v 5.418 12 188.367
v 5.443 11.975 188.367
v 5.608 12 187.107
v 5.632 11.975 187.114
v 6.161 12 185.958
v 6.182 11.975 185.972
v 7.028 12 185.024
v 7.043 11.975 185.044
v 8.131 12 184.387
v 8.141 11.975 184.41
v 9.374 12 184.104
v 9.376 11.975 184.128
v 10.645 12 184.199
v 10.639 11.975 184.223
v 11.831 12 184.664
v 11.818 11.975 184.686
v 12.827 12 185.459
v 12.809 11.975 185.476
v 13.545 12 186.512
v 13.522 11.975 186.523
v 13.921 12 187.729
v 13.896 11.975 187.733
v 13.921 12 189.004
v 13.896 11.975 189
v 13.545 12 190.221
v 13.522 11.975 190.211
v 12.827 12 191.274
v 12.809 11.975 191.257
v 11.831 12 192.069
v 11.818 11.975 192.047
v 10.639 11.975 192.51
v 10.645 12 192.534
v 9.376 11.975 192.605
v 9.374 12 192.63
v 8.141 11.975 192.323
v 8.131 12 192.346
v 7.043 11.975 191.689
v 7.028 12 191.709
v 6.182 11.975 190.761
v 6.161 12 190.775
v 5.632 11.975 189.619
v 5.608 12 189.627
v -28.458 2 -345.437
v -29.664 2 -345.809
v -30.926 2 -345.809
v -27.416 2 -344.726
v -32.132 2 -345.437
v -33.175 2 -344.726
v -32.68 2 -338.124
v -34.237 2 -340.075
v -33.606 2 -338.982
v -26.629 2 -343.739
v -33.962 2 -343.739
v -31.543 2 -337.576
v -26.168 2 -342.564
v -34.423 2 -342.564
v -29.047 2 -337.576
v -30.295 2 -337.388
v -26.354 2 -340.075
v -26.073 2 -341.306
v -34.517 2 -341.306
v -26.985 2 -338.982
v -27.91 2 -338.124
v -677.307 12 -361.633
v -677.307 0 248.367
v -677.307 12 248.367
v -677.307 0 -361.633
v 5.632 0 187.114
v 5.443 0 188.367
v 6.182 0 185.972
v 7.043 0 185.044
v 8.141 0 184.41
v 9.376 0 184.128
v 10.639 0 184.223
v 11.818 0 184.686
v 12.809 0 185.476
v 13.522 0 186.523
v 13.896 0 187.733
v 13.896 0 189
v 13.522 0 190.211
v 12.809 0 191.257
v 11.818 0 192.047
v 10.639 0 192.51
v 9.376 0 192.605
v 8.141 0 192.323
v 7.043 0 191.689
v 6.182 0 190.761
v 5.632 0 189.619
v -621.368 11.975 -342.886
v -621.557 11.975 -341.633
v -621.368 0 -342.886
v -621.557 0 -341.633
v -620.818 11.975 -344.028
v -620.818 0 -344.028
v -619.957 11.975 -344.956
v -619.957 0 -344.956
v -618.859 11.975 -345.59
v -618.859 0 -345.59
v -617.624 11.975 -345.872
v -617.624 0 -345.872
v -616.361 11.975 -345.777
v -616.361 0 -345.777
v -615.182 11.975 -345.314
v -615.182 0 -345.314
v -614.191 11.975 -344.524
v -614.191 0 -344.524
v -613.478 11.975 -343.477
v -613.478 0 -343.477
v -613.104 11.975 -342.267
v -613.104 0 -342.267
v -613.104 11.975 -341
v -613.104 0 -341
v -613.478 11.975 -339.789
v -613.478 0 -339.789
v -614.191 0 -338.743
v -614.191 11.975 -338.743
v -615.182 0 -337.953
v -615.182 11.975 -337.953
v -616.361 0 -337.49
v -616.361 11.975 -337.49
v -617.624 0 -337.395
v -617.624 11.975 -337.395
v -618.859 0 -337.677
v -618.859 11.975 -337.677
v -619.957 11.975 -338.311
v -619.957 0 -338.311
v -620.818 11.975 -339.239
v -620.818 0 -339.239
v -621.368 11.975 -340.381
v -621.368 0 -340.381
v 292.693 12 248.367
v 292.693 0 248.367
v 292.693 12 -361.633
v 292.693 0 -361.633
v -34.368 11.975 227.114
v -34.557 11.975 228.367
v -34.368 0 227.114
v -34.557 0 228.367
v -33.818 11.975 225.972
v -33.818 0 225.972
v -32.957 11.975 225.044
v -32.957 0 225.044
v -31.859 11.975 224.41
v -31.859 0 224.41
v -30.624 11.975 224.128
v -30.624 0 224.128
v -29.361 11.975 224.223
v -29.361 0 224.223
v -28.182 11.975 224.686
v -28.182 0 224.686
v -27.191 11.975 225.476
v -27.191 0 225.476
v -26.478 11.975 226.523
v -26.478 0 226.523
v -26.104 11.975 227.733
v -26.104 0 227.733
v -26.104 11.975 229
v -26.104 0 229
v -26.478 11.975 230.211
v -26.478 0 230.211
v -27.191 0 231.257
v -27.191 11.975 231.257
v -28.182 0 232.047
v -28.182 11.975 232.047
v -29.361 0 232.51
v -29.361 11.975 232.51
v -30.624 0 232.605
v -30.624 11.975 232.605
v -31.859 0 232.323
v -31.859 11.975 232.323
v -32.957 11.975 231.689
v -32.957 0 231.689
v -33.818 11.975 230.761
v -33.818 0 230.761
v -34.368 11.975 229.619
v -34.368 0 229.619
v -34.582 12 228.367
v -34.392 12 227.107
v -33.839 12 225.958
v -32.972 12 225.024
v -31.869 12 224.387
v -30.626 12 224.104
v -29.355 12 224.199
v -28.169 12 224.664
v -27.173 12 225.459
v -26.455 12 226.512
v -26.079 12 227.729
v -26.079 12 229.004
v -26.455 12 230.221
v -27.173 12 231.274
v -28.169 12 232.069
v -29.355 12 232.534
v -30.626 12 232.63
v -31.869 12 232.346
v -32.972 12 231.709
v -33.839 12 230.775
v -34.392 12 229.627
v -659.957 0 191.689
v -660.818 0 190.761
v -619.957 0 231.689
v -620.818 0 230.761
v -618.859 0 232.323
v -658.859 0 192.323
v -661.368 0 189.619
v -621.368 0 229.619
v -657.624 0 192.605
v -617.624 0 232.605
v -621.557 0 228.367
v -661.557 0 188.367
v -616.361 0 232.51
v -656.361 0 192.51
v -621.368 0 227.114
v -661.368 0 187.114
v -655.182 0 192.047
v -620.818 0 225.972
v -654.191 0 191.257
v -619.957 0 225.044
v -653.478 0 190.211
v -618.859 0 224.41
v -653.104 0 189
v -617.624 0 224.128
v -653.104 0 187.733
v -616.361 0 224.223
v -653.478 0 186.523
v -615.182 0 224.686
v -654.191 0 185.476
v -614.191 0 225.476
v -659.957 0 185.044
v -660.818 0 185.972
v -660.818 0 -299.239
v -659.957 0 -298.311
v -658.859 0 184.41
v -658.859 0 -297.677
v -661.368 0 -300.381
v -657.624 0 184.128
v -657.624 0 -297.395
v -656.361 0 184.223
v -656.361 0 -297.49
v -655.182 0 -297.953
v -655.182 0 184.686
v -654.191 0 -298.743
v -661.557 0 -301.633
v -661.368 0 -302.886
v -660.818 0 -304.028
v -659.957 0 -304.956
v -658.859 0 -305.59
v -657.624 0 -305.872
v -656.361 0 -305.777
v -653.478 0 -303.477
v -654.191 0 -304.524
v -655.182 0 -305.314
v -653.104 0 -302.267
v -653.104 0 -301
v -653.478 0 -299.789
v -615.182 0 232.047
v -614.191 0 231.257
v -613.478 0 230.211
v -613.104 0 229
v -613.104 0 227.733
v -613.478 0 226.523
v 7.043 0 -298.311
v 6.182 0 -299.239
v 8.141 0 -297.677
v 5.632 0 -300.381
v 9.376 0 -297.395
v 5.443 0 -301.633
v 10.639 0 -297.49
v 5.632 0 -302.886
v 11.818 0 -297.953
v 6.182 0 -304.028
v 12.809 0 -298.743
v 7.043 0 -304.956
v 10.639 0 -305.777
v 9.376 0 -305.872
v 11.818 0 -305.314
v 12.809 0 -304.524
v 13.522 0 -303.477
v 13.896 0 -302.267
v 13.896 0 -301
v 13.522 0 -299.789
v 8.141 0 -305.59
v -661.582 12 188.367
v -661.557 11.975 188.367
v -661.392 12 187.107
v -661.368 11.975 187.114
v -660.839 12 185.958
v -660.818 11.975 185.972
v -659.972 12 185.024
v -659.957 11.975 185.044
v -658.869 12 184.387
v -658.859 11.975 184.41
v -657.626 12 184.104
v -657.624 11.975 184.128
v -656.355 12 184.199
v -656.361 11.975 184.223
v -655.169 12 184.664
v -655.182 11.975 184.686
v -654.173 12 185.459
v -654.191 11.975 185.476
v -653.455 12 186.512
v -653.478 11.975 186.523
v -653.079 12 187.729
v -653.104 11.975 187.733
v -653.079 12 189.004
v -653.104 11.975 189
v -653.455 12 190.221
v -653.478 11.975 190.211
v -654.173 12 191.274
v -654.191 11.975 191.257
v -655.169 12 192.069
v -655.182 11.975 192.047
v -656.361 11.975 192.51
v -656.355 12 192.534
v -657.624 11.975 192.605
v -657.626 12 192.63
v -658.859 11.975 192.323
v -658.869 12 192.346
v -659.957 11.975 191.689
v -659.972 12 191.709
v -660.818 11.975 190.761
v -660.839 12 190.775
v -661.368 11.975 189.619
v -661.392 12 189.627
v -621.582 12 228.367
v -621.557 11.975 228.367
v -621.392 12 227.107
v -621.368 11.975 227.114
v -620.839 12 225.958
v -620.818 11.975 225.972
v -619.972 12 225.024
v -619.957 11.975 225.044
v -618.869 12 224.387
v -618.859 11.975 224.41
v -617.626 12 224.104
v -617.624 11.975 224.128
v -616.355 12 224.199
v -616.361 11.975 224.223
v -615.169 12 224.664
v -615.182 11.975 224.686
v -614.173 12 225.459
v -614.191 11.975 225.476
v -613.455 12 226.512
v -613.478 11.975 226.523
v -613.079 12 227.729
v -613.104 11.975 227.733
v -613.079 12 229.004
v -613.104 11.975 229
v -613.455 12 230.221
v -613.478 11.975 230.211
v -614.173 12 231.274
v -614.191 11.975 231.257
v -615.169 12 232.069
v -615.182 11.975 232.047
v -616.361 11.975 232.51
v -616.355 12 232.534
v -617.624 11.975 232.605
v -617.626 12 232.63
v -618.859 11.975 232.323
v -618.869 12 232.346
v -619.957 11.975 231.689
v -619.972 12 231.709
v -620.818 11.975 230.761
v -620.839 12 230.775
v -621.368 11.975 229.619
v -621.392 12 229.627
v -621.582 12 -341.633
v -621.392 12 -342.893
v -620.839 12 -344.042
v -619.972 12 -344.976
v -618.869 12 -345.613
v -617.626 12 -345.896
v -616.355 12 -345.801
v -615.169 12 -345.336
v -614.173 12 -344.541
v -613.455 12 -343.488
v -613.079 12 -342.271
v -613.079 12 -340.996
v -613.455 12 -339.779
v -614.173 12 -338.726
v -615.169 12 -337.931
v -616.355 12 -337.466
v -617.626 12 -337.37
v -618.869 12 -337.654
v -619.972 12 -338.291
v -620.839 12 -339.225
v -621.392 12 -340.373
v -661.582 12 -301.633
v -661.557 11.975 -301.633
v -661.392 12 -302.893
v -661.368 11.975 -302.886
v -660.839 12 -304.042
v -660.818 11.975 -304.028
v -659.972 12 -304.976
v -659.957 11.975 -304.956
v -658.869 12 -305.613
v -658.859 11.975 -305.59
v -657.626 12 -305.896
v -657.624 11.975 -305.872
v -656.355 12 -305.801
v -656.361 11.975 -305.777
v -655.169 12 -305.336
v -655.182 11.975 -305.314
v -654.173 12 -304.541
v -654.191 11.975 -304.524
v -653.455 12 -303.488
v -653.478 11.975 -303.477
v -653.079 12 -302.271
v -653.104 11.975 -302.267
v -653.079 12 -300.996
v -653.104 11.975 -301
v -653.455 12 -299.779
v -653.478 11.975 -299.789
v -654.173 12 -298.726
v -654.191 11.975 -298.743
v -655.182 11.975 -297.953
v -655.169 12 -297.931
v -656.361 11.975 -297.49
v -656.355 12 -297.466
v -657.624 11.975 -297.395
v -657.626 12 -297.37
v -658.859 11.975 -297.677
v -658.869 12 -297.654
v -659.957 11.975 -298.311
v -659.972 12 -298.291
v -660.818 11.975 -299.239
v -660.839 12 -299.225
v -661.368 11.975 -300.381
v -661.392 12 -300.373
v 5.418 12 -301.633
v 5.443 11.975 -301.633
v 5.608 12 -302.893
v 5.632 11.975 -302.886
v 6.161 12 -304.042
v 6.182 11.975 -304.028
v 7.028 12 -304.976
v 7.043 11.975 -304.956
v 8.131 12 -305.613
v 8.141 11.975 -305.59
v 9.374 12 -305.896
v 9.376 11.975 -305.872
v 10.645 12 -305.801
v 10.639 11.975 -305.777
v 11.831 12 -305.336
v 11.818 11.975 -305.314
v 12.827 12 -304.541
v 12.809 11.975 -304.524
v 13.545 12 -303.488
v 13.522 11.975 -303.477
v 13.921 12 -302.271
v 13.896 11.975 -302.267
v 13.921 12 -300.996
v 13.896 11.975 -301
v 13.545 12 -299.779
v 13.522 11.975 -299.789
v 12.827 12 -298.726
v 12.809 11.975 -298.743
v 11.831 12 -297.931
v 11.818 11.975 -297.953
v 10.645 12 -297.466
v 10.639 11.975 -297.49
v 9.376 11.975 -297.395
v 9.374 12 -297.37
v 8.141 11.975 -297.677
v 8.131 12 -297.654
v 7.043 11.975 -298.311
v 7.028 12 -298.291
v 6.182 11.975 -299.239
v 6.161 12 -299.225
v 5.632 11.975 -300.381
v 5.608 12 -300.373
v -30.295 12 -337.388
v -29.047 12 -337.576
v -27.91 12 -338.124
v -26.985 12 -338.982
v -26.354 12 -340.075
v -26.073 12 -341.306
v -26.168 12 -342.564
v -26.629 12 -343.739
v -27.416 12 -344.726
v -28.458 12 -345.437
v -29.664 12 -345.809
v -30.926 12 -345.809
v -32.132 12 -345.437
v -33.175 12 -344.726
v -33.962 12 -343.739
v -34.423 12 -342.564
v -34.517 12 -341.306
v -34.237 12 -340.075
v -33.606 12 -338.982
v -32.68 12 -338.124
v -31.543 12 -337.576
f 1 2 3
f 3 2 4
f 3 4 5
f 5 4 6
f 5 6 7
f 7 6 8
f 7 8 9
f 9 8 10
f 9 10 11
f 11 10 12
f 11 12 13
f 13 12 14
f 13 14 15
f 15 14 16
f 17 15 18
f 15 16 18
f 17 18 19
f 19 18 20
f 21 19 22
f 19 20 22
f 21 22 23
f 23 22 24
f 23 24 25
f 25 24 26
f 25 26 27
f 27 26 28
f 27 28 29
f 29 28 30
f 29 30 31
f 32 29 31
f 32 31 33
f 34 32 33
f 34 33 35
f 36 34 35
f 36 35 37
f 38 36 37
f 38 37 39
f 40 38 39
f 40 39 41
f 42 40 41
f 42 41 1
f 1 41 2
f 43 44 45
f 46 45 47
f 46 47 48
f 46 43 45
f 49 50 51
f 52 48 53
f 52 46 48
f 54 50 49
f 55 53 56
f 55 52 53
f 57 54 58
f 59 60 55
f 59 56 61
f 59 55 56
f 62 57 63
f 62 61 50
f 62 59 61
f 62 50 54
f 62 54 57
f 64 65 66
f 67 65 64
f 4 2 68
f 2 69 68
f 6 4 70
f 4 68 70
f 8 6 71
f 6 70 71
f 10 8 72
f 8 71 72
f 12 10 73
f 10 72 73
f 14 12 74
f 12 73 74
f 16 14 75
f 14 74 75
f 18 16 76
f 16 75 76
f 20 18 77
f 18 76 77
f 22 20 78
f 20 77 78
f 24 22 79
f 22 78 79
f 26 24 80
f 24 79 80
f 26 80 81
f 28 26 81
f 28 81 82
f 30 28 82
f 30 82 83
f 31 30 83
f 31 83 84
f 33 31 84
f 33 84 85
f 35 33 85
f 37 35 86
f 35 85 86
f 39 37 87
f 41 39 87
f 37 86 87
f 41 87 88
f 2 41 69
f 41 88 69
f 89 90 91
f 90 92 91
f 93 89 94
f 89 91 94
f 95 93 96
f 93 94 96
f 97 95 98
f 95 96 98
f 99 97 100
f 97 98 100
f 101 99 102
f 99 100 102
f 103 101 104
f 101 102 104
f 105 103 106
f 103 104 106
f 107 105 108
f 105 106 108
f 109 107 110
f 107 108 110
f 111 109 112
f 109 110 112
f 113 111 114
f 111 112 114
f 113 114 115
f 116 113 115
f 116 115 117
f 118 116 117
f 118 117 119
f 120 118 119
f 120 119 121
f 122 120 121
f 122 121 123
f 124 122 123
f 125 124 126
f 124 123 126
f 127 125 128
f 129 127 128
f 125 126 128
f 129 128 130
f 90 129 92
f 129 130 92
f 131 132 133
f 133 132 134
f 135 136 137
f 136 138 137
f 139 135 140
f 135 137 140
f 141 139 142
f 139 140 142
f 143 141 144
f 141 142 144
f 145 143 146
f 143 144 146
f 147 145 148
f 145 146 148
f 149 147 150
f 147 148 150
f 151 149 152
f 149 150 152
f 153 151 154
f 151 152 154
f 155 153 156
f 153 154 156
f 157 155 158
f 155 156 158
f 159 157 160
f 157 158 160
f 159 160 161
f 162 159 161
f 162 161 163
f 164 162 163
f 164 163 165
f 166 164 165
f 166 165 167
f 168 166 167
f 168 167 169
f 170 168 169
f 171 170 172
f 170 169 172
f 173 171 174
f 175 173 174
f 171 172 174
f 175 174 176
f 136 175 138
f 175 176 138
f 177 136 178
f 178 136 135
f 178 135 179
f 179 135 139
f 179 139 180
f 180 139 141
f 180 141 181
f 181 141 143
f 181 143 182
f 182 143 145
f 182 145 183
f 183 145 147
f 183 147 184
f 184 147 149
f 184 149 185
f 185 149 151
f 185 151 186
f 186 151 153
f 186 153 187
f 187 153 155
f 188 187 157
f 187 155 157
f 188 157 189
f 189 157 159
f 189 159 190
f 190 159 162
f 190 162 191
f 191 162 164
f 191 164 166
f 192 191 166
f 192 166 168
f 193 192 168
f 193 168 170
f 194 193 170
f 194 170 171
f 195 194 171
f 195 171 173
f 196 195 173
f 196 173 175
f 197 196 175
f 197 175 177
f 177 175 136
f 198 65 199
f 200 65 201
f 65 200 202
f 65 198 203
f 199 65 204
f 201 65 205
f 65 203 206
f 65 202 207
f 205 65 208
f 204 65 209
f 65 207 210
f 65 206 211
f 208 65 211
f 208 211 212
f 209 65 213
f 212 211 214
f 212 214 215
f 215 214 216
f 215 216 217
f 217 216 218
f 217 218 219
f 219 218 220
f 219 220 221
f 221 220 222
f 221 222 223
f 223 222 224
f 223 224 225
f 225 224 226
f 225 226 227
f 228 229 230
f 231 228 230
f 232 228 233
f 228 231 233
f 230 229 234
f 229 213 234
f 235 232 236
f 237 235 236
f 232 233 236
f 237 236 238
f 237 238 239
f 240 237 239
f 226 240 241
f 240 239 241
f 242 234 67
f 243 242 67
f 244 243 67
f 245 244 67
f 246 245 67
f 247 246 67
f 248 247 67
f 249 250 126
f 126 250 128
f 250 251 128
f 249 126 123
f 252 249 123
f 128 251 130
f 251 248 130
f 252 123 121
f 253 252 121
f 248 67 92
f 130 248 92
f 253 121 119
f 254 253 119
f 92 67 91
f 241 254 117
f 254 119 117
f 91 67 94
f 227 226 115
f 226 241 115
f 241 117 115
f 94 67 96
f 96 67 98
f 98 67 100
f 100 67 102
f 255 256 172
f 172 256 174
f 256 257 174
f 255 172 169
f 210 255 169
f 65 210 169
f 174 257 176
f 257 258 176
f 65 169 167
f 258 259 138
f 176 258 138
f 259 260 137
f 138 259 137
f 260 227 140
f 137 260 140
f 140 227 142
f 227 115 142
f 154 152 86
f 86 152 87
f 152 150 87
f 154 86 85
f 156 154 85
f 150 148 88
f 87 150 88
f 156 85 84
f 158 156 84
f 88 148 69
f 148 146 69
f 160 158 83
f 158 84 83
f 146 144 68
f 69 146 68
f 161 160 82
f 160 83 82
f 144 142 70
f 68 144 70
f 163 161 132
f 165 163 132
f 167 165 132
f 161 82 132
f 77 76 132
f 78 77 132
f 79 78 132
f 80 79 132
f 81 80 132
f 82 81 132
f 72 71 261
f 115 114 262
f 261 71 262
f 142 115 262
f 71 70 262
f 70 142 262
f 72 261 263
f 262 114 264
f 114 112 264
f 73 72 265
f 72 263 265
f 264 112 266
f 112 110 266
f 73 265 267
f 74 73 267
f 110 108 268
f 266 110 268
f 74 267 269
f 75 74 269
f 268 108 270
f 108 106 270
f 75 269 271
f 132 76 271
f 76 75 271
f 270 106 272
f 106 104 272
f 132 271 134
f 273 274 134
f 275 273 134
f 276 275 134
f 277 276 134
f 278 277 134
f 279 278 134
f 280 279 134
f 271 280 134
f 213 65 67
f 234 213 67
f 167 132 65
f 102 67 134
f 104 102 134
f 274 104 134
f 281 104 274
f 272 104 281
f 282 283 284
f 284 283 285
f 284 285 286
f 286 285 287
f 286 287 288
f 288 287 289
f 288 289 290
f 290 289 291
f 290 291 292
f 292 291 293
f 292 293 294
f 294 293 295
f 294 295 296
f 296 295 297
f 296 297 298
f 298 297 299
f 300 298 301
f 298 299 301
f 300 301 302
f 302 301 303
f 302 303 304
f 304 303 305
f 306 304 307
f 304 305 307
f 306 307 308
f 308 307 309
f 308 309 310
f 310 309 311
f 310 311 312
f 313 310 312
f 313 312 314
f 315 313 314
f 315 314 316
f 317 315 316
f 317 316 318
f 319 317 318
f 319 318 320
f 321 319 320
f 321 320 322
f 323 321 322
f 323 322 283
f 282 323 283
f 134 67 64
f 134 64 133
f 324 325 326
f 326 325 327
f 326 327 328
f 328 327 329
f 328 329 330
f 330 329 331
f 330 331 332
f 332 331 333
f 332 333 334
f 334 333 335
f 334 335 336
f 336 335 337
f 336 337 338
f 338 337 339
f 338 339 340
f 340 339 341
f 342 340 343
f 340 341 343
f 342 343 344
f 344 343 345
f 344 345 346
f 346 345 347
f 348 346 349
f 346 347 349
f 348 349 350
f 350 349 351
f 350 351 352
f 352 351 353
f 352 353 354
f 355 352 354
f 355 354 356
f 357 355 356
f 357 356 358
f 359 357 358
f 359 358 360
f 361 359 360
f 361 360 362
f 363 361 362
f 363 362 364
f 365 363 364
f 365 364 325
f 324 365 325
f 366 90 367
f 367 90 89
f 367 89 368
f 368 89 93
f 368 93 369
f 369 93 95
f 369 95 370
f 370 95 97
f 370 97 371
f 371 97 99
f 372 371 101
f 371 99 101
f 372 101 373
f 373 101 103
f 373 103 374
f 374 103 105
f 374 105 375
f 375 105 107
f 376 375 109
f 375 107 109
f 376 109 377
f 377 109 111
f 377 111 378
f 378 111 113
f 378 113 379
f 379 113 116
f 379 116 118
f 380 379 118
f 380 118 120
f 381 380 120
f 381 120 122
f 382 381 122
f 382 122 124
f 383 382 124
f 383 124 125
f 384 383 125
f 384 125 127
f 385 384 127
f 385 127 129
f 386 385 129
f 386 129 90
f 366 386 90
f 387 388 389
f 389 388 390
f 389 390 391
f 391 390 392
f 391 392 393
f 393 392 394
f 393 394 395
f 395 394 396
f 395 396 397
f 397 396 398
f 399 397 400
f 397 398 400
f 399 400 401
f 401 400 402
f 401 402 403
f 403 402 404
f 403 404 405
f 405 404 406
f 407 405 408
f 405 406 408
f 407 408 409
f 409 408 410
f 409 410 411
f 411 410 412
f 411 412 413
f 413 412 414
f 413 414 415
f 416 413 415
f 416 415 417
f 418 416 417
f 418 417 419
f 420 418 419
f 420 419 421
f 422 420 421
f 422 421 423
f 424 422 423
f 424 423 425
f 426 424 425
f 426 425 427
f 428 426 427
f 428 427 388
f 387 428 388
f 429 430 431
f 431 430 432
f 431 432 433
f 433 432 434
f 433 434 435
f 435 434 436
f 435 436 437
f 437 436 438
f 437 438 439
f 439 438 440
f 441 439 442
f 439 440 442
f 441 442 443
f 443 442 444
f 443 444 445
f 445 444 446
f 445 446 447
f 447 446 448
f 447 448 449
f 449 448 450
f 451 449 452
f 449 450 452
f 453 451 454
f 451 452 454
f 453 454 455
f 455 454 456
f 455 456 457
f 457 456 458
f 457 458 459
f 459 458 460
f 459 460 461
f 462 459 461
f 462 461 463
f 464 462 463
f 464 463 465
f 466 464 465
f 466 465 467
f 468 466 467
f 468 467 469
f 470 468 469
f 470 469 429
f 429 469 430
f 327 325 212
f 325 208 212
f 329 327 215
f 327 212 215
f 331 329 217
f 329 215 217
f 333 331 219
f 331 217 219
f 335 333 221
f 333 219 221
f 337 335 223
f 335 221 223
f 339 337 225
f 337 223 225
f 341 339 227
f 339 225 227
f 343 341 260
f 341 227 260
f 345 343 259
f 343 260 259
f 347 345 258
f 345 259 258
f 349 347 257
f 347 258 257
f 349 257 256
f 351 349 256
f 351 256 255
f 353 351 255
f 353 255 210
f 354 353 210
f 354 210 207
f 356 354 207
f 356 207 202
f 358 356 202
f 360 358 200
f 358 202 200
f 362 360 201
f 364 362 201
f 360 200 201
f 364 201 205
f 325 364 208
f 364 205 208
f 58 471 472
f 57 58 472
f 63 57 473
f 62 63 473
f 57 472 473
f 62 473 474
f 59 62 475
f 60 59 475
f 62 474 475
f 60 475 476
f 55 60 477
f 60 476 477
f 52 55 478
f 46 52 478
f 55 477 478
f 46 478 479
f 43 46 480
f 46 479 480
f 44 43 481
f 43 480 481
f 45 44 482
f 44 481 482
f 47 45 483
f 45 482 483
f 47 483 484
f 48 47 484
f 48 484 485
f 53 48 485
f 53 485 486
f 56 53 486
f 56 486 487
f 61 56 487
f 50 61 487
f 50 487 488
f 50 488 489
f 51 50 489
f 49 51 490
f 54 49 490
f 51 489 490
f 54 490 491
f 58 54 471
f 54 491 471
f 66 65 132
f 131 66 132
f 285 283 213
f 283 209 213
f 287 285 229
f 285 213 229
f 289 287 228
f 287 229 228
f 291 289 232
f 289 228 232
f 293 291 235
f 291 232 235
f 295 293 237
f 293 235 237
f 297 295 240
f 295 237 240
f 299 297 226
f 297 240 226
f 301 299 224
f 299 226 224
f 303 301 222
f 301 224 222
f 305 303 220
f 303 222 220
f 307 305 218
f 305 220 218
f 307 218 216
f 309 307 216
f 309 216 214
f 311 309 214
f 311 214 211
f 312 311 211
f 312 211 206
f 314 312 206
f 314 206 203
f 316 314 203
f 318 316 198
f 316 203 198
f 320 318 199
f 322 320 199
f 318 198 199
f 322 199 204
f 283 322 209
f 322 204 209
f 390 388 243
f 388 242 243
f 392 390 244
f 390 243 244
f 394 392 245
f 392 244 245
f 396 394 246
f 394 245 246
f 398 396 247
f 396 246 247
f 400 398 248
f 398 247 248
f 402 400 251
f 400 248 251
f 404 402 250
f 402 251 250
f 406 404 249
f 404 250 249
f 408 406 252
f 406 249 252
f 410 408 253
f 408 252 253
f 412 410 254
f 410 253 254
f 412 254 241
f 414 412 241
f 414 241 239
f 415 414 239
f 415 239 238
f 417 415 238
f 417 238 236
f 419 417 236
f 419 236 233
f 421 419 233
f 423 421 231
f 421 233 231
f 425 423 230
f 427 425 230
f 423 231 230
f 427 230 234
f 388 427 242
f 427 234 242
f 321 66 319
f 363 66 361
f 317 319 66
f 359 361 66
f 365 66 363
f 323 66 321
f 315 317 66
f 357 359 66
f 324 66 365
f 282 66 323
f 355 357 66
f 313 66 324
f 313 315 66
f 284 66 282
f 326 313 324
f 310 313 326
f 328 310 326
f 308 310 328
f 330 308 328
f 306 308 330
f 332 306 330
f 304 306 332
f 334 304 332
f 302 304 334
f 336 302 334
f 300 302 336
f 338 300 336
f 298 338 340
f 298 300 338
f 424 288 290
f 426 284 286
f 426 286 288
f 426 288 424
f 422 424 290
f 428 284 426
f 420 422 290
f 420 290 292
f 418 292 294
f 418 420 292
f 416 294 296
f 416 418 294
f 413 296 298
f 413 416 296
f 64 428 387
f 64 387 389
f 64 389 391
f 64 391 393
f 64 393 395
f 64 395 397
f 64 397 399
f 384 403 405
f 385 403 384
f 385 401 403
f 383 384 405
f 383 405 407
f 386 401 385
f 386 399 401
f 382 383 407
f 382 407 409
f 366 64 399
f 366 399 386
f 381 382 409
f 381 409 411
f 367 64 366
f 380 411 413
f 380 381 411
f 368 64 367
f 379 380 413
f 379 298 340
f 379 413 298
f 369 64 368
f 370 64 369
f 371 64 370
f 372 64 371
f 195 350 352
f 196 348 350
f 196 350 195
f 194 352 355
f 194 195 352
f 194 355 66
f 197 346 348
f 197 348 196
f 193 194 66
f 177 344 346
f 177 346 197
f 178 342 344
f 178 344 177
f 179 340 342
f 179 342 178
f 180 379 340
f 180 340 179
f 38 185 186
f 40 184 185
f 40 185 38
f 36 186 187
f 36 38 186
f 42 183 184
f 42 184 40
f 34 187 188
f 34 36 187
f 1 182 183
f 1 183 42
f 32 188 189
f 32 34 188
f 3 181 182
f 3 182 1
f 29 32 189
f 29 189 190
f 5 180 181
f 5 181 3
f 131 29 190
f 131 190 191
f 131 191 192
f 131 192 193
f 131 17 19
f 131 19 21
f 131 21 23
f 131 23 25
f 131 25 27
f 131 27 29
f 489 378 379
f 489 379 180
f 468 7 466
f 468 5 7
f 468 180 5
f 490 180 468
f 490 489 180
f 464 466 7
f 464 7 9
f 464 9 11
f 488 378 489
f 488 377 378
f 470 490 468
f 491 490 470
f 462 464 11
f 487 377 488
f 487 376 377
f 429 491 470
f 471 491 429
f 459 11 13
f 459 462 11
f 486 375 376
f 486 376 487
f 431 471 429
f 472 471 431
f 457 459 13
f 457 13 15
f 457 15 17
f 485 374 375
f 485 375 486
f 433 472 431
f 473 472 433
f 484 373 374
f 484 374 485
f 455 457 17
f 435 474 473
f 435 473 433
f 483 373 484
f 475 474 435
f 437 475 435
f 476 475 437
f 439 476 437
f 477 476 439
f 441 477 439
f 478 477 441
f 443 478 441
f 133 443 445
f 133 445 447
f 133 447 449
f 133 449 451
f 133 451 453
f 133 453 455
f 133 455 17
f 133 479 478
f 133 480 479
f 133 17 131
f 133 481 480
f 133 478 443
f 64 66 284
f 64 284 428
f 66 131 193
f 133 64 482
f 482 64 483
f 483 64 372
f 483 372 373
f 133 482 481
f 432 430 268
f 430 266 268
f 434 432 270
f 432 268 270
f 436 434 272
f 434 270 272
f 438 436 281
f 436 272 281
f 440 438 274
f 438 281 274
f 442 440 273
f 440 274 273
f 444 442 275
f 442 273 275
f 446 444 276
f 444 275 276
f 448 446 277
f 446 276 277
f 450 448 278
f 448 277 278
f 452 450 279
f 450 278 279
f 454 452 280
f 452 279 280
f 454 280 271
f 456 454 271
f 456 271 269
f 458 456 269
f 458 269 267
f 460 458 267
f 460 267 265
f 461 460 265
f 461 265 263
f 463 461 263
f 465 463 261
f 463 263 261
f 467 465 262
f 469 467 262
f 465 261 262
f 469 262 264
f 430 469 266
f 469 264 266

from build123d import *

# Parameters (mm, degrees)
SKETCH1_W                          = 970
SKETCH1_H                          = 610
BOSS_EXTRUDE1_DEPTH                = 12
SKETCH2_R                          = 4.233877047
CUT_EXTRUDE1_DEPTH                 = 10
TAP_DRILL_FOR_M10_TAP1_D           = 8.5
TAP_DRILL_FOR_M10_TAP1_CSINK_D     = 8.55
TAP_DRILL_FOR_M10_TAP1_CSINK_ANGLE = 90


with BuildPart() as part:
    # Sketch1 → Boss-Extrude1 (new body)
    with BuildSketch(Plane(origin=(0, 0, 0), x_dir=(1, 0, 0), z_dir=(0, 1, 0))):
        with Locations((-192.306733167, 56.633416459)):
            Rectangle(SKETCH1_W, SKETCH1_H)
    extrude(amount=BOSS_EXTRUDE1_DEPTH)

    # Sketch2 → Cut-Extrude1 (cut)
    with BuildSketch(Plane(origin=(0, 12, 0), x_dir=(1, 0, 0), z_dir=(0, 1, 0))):
        with Locations(Location((-30.29537408, 341.621974399, 0), (0, 0, 270))):
            Circle(SKETCH2_R)
    extrude(amount=-CUT_EXTRUDE1_DEPTH, mode=Mode.SUBTRACT)

    # Tap Drill for M10 Tap1 (through all)
    with Locations(Plane(origin=(0, 12, 0), x_dir=(1, 0, 0), z_dir=(0, 1, 0))):
        with Locations((-617.306733167, 341.633416459), (-657.306733167, 301.633416459), (-617.306733167, -228.366583541), (-657.306733167, -188.366583541), (9.693266833, -188.366583541), (-30.306733167, -228.366583569), (9.693266833, 301.633416459)):
            CounterSinkHole(TAP_DRILL_FOR_M10_TAP1_D / 2, TAP_DRILL_FOR_M10_TAP1_CSINK_D / 2, counter_sink_angle=TAP_DRILL_FOR_M10_TAP1_CSINK_ANGLE)


solid = part.part
